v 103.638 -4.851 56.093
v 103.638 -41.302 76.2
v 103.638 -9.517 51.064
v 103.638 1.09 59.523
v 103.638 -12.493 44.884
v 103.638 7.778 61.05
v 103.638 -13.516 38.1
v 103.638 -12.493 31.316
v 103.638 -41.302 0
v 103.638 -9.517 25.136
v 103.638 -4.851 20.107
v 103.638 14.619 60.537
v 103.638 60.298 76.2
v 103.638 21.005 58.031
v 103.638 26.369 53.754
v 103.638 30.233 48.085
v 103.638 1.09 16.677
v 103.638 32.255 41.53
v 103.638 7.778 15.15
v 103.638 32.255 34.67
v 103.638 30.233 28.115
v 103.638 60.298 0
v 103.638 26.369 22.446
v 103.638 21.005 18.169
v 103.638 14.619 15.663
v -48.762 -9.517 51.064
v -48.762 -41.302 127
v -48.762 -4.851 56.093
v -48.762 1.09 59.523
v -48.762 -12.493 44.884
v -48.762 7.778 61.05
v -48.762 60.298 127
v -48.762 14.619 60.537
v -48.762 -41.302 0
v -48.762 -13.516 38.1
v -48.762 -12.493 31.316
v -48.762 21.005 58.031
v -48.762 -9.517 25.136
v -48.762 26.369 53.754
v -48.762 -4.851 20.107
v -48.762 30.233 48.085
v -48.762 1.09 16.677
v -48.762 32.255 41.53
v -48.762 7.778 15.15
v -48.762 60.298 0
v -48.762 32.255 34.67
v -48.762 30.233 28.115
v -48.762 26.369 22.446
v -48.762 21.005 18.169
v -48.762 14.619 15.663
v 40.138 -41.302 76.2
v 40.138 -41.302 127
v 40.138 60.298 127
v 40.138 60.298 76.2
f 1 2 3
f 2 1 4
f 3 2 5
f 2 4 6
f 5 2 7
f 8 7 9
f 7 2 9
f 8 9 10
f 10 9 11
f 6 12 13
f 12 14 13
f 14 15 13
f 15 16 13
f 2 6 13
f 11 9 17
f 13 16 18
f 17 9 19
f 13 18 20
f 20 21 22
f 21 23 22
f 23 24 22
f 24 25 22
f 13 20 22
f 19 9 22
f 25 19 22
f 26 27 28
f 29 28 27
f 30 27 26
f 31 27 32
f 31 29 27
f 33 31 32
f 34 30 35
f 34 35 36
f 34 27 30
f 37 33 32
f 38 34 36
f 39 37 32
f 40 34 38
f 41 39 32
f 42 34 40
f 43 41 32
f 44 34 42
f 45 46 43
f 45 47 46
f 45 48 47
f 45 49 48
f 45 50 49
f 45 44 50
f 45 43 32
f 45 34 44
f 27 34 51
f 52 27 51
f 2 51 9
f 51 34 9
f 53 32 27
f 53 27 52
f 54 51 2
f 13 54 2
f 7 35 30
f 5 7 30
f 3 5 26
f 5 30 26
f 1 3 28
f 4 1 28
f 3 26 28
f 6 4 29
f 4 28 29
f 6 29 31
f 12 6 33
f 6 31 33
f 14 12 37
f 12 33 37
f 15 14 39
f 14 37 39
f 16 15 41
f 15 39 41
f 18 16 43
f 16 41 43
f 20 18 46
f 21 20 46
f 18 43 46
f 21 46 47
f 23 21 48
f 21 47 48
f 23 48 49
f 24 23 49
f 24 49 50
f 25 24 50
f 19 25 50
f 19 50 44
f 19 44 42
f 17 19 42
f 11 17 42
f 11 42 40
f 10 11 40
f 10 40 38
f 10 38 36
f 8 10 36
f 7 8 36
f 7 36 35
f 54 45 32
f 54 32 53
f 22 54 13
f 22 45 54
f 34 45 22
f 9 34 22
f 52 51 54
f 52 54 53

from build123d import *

# Parameters (mm, degrees)
F0_W     = 152.4
F0_H     = 101.6
F1_DEPTH = 127
F2_W     = 63.5
F2_H     = 50.8
F3_DEPTH = 103.87561
F4_R     = 23.014018
F6_DEPTH = 152.401


with BuildPart() as f1:
    # F0 (on Top) → F1 (new body)
    with BuildSketch(Plane.XY):
        with Locations((27.437925, 9.498095)):
            Rectangle(F0_W, F0_H)
    extrude(amount=F1_DEPTH)

    # F2 (on face) → F3 (cut)
    with BuildSketch(Plane.XZ.offset(41.301905)):
        with Locations((71.887925, 101.6)):
            Rectangle(F2_W, F2_H)
    extrude(amount=-F3_DEPTH, mode=Mode.SUBTRACT)

    # F4 (on face) → F6 (cut, through all)
    with BuildSketch(Plane(origin=(-48.762075, 0, 0), x_dir=(0, -1, 0), z_dir=(-1, 0, 0))):
        with Locations((-9.498095, 38.1)):
            Circle(F4_R)
    extrude(amount=-F6_DEPTH, mode=Mode.SUBTRACT)


solid = f1.part
